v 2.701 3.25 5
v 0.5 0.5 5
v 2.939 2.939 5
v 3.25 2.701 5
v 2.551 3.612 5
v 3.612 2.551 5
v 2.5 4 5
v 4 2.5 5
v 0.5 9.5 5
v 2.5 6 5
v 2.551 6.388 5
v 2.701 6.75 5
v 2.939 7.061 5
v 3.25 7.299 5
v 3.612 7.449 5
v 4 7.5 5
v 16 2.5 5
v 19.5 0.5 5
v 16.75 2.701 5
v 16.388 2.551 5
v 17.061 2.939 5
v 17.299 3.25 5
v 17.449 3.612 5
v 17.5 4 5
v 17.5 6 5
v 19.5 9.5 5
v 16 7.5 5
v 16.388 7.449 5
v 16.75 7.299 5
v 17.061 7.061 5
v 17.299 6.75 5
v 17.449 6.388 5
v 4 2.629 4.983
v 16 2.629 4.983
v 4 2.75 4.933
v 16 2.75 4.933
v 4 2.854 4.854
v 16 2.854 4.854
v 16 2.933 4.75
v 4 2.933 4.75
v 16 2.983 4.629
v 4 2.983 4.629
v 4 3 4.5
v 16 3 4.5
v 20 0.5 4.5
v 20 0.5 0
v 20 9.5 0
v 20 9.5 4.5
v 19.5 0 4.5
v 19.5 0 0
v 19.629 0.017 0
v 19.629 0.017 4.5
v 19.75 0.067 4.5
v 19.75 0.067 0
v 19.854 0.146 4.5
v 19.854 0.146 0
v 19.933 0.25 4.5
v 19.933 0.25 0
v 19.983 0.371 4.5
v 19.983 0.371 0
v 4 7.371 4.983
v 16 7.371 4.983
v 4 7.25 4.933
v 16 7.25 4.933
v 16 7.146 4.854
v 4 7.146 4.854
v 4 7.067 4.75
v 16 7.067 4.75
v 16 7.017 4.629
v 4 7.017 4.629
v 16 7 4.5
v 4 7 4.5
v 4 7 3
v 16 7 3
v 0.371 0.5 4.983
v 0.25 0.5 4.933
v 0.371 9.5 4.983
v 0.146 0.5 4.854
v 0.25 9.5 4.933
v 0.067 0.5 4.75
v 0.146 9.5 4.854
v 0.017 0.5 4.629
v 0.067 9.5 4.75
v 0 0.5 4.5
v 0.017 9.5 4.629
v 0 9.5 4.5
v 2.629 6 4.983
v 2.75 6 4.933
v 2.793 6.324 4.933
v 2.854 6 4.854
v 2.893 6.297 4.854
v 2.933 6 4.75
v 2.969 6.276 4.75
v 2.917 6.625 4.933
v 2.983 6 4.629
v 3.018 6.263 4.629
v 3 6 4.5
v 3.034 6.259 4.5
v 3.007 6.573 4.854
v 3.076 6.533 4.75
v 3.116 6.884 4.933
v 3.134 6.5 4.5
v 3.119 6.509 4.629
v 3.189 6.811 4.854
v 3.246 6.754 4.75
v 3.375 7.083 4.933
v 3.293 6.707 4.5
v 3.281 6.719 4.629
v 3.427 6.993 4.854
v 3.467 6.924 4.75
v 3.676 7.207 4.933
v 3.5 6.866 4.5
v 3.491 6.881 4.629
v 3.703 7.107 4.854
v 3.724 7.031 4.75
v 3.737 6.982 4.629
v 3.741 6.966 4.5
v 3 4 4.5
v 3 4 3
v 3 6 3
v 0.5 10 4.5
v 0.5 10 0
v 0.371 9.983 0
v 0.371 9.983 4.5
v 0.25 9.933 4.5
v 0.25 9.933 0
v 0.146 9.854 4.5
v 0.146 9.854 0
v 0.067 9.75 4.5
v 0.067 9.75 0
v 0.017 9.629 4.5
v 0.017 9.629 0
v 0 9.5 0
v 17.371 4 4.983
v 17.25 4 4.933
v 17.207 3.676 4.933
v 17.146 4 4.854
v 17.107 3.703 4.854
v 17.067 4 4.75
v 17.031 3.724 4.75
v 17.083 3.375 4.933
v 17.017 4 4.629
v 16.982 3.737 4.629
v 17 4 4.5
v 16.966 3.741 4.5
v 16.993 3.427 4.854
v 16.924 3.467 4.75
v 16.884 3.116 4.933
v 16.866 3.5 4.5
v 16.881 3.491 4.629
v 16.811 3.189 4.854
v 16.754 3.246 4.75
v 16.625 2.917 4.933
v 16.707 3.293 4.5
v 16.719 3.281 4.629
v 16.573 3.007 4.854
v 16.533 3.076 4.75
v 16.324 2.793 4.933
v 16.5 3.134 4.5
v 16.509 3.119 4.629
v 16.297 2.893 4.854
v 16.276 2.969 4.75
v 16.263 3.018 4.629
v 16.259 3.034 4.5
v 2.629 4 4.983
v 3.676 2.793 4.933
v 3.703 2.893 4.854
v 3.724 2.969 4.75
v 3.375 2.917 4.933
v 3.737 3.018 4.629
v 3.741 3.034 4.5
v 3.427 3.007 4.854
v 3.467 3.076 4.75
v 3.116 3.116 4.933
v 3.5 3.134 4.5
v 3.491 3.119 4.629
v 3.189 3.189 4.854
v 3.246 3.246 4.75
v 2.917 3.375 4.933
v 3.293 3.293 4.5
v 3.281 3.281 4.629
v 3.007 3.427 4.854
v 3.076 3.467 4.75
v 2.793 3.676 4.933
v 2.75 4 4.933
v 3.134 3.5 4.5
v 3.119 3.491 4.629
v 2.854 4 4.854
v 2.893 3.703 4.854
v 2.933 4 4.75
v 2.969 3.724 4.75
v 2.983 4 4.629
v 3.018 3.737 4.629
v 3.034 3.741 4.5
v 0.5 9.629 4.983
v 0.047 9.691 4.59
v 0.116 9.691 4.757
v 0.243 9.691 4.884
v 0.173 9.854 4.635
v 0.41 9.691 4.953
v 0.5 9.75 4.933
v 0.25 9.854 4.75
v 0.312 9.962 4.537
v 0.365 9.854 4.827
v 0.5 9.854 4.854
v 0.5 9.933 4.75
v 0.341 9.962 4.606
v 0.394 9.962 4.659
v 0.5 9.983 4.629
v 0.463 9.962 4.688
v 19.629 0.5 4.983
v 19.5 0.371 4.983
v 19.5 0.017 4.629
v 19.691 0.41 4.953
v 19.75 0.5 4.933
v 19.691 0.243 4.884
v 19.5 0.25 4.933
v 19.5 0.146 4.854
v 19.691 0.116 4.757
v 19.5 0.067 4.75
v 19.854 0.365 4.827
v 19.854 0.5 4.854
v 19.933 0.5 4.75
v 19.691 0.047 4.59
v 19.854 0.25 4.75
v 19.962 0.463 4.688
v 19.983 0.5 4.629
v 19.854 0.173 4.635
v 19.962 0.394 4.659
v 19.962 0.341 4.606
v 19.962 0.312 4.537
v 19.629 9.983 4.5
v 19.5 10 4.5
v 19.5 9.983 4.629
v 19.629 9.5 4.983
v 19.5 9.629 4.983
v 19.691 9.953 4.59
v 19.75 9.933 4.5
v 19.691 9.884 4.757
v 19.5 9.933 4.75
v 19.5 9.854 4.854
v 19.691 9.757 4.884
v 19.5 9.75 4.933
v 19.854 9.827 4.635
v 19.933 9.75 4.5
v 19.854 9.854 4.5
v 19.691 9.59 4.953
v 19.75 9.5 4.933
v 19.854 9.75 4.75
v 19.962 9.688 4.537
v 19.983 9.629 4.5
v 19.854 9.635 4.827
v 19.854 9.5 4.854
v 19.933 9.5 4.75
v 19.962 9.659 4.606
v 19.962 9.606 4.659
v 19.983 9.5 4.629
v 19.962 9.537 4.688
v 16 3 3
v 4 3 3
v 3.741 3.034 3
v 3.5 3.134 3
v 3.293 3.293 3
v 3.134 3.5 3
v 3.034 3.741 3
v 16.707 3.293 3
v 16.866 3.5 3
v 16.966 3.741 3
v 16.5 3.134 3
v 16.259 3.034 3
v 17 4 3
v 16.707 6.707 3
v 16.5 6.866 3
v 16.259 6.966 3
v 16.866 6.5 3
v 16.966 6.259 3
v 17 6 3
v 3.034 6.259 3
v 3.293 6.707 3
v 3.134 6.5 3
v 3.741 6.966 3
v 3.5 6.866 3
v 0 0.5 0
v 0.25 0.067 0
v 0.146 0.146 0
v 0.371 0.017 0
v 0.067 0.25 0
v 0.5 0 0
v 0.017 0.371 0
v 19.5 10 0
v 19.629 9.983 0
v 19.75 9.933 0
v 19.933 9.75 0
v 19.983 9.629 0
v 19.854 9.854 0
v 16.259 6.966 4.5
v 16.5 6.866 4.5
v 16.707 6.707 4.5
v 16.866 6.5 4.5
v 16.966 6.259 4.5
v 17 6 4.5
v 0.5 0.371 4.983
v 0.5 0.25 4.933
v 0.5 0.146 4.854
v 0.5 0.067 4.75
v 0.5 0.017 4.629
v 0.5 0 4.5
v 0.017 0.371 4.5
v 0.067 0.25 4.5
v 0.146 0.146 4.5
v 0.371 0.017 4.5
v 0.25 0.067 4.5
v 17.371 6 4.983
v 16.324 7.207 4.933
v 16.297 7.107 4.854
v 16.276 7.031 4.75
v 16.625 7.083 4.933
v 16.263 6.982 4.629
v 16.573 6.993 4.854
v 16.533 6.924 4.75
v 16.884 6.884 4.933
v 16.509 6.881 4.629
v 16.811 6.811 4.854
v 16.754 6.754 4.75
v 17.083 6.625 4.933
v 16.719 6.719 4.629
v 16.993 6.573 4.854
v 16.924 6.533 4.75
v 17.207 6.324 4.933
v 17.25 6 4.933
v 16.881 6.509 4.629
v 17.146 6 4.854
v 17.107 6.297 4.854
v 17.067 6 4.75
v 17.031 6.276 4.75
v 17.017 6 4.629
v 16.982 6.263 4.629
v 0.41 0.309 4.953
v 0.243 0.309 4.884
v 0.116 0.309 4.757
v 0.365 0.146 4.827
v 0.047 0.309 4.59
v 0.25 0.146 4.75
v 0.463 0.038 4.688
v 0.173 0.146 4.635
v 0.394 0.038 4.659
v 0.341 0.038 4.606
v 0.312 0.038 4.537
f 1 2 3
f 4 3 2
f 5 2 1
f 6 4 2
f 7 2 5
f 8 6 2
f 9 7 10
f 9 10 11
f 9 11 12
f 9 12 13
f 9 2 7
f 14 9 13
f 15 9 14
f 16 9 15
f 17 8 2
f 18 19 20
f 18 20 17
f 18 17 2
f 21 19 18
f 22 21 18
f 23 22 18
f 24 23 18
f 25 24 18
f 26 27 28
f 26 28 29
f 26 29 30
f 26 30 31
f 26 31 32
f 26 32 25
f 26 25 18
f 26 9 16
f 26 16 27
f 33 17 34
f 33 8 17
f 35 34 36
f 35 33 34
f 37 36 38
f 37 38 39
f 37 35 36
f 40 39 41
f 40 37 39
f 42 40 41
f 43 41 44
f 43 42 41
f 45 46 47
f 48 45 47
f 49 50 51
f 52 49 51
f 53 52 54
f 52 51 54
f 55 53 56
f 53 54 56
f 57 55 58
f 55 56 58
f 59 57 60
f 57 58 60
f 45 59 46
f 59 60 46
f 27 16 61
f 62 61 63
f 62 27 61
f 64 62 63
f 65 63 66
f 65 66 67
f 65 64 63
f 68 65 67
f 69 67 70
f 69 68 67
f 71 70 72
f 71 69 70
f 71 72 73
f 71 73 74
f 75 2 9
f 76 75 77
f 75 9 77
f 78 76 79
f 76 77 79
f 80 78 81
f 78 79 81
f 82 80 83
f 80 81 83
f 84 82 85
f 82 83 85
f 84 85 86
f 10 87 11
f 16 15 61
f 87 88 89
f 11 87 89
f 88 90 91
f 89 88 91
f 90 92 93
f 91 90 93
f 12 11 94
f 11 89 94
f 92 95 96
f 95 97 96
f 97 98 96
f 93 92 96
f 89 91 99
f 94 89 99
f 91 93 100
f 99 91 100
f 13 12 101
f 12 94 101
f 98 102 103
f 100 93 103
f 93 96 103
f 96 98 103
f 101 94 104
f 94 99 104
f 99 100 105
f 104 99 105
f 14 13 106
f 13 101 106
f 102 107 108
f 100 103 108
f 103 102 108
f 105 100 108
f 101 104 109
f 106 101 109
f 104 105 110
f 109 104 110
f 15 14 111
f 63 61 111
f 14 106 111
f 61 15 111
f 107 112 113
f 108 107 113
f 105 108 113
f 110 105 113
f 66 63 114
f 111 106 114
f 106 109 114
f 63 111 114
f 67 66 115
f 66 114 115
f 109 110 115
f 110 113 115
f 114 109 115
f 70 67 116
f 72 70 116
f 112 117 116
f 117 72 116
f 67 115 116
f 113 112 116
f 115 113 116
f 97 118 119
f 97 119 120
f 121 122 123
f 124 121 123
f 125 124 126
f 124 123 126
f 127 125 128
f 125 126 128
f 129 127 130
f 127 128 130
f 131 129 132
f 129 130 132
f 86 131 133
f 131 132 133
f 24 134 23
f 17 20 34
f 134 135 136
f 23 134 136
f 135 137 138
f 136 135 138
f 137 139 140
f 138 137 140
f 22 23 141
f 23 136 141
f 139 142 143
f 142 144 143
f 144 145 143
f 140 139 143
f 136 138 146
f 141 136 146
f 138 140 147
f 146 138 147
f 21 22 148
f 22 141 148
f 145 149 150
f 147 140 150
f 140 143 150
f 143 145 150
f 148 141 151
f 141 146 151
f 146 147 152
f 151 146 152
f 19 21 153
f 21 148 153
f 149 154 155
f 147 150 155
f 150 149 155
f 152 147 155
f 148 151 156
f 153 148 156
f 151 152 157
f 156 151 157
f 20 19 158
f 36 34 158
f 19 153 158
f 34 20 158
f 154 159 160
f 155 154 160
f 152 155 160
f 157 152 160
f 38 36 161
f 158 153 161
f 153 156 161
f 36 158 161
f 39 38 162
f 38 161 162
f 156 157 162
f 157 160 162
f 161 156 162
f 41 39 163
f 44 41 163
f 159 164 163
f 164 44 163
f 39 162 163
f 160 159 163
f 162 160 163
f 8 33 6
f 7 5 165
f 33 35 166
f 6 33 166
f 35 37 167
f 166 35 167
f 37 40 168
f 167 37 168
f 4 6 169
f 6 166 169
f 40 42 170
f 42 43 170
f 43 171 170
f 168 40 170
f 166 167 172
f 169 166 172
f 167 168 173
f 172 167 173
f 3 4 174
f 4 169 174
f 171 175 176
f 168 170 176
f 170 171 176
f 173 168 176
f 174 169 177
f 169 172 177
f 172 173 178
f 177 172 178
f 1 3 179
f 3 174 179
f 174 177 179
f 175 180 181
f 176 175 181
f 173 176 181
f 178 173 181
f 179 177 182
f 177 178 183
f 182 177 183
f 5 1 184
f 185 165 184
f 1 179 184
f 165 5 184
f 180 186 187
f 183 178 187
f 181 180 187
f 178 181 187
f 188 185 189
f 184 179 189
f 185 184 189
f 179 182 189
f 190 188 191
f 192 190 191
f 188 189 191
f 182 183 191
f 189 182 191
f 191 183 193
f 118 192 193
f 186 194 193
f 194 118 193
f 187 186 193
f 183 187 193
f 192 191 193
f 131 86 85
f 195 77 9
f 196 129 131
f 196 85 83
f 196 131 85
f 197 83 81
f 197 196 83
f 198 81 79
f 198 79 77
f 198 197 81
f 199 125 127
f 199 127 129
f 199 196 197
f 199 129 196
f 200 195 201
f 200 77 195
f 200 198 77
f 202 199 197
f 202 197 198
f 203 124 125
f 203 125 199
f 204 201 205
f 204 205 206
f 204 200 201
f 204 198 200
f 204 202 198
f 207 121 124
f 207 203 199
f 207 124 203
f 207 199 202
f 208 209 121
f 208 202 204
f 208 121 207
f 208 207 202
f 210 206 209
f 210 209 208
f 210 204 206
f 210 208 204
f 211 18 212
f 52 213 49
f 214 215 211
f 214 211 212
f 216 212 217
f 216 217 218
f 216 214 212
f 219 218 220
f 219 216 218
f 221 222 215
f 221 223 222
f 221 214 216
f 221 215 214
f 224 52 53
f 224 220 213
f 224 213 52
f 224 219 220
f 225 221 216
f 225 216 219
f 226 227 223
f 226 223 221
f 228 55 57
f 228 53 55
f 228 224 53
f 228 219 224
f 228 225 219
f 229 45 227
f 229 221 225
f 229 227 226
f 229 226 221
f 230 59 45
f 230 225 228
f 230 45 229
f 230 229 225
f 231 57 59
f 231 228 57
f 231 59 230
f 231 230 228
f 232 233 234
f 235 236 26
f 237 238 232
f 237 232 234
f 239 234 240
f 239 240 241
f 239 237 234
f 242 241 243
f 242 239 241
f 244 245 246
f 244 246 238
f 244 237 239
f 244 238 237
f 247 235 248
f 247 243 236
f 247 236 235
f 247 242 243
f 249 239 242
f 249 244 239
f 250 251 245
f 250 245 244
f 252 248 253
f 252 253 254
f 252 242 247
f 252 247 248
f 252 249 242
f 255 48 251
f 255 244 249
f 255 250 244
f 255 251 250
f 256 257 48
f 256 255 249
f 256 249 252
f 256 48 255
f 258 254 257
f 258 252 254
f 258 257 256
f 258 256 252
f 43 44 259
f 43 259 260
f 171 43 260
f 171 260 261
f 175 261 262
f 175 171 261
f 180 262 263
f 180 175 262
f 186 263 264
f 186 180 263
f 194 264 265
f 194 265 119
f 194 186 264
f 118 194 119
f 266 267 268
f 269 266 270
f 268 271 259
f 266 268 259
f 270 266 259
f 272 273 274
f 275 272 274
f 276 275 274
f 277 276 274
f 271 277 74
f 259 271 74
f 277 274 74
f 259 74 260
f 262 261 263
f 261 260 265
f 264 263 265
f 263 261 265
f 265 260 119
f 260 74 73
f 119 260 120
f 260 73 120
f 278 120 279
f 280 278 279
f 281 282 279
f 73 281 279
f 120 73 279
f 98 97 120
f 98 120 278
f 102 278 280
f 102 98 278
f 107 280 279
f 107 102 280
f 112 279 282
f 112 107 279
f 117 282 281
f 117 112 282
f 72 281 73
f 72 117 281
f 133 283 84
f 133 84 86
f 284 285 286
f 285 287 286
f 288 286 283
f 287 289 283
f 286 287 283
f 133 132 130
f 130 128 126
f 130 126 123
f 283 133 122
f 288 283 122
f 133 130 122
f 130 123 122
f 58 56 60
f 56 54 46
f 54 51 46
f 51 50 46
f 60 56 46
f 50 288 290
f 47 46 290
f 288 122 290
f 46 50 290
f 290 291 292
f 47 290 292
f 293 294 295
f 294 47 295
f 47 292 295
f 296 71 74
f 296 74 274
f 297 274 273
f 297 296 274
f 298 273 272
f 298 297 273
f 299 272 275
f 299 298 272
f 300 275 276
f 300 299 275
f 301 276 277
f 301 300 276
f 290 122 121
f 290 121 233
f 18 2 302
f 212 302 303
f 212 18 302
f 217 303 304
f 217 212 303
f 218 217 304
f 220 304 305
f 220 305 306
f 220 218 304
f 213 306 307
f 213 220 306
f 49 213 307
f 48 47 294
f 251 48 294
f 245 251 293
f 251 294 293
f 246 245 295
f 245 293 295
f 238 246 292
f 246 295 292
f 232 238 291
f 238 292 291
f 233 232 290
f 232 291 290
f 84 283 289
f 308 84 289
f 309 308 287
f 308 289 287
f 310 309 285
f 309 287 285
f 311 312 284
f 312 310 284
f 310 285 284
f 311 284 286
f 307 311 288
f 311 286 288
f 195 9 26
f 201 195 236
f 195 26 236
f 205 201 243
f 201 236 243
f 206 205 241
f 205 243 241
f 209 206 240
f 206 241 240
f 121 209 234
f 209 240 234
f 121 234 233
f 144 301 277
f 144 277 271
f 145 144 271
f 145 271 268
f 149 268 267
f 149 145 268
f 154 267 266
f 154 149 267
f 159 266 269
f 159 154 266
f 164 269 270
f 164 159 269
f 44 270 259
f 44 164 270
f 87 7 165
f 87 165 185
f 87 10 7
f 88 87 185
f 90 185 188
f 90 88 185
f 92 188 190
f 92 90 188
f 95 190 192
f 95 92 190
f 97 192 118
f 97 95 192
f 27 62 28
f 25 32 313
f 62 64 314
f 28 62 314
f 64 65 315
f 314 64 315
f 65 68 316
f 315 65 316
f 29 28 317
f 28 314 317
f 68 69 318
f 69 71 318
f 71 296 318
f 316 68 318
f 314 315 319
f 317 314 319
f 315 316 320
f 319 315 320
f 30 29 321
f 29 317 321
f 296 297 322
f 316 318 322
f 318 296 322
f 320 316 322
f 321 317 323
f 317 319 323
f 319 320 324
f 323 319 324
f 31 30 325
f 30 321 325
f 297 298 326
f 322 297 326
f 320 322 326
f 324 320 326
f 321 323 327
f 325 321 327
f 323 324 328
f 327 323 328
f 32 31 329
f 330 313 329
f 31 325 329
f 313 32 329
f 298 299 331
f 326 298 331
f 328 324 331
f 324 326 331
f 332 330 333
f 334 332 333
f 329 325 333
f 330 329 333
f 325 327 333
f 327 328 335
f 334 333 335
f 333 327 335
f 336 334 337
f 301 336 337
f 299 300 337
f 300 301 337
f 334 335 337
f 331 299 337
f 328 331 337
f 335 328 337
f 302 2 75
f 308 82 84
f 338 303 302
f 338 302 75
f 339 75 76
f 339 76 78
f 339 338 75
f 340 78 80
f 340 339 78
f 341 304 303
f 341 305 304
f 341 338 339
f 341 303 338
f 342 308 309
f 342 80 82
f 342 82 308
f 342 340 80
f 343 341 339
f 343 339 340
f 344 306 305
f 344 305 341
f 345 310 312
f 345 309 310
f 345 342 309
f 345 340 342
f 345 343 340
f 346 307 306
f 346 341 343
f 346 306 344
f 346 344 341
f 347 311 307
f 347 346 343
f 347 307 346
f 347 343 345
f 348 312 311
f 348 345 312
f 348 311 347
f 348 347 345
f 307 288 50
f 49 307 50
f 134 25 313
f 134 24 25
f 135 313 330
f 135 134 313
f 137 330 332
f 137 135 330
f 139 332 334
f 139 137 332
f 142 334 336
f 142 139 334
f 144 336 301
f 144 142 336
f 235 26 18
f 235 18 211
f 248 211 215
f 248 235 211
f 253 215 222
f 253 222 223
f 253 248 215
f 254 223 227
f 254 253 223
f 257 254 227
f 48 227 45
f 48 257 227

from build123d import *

# Parameters (mm, degrees)
SKIZZE1_W                       = 20
SKIZZE1_H                       = 10
AUFSATZ_LINEAR_AUSTRAGEN1_DEPTH = 5
SCHNITT_LINEAR_AUSTRAGEN2_DEPTH = 2
VERRUNDUNG2_R                   = 0.5
VERRUNDUNG3_R                   = 0.5
VERRUNDUNG4_R                   = 0.5
VERRUNDUNG5_R                   = 0.5
VERRUNDUNG6_R                   = 0.5
VERRUNDUNG7_R                   = 0.5


with BuildPart() as part:
    # Skizze1 → Aufsatz-Linear austragen1 (new body)
    with BuildSketch(Plane.XY):
        with Locations((10, 5)):
            Rectangle(SKIZZE1_W, SKIZZE1_H)
    extrude(amount=AUFSATZ_LINEAR_AUSTRAGEN1_DEPTH)

    # Skizze3 → Schnitt-Linear austragen2 (cut)
    with BuildSketch(Plane.XY.offset(5)):
        with BuildLine():
            Line((4, 7), (16, 7))
            ThreePointArc((16, 7), (16.707106781, 6.707106781), (17, 6))
            Line((17, 6), (17, 4))
            ThreePointArc((17, 4), (16.707106781, 3.292893219), (16, 3))
            Line((16, 3), (4, 3))
            ThreePointArc((4, 3), (3.292893219, 3.292893219), (3, 4))
            Line((3, 4), (3, 6))
            ThreePointArc((3, 6), (3.292893219, 6.707106781), (4, 7))
        make_face()
    extrude(amount=-SCHNITT_LINEAR_AUSTRAGEN2_DEPTH, mode=Mode.SUBTRACT)

    # Verrundung2
    verrundung2_edges = [part.edges().sort_by_distance(p)[0] for p in [
        (3.292893219, 3.292893219, 5),
        (10, 3, 5),
        (16.707106781, 3.292893219, 5),
        (17, 5, 5),
        (16.707106781, 6.707106781, 5),
        (10, 7, 5),
        (3.292893219, 6.707106781, 5),
        (3, 5, 5),
    ]]
    fillet(verrundung2_edges, radius=VERRUNDUNG2_R)

    # Verrundung3
    verrundung3_edges = [part.edges().sort_by_distance(p)[0] for p in [
        (20, 5, 5),
        (10, 10, 5),
        (0, 5, 5),
        (10, 0, 5),
    ]]
    fillet(verrundung3_edges, radius=VERRUNDUNG3_R)

    # Verrundung4
    # the kernel refuses this fillet: 0.5 mm, written as the material it takes off along each edge
    with BuildSketch(Plane(origin=(19.5, 9.5, 4.5), x_dir=(0, 1, 0), z_dir=(1, 0, 0))) as verrundung4_piece_1_section:
        Polygon((0, 0), (VERRUNDUNG4_R, 0), (VERRUNDUNG4_R, VERRUNDUNG4_R), (0, VERRUNDUNG4_R), align=None)
    verrundung4_piece_1 = extrude(amount=VERRUNDUNG4_R, mode=Mode.PRIVATE)
    verrundung4_piece_1 = verrundung4_piece_1 - Plane(origin=(19.5, 9.5, 4.5), x_dir=(0, -0.7071067811865475, -0.7071067811865475), z_dir=(1, 0, 0)) * Sphere(VERRUNDUNG4_R, mode=Mode.PRIVATE)
    add(verrundung4_piece_1, mode=Mode.SUBTRACT)
    with BuildSketch(Plane(origin=(20, 10, -1.25), x_dir=(0, -1, 0), z_dir=(0, 0, 1))) as verrundung4_piece_2:
        with BuildLine():
            CenterArc((VERRUNDUNG4_R, -VERRUNDUNG4_R), VERRUNDUNG4_R, 90, 90)
            Line((0, -VERRUNDUNG4_R), (0, 0))
            Line((0, 0), (VERRUNDUNG4_R, 0))
        make_face()
    extrude(amount=5.75, mode=Mode.SUBTRACT)

    # Verrundung5
    # the kernel refuses this fillet: 0.5 mm, written as the material it takes off along each edge
    with BuildSketch(Plane(origin=(0.5, 9.5, 4.5), x_dir=(-1, 0, 0), z_dir=(0, 1, 0))) as verrundung5_piece_1_section:
        Polygon((0, 0), (VERRUNDUNG5_R, 0), (VERRUNDUNG5_R, VERRUNDUNG5_R), (0, VERRUNDUNG5_R), align=None)
    verrundung5_piece_1 = extrude(amount=VERRUNDUNG5_R, mode=Mode.PRIVATE)
    verrundung5_piece_1 = verrundung5_piece_1 - Plane(origin=(0.5, 9.5, 4.5), x_dir=(0.7071067811865475, 0, -0.7071067811865475), z_dir=(0, 1, 0)) * Sphere(VERRUNDUNG5_R, mode=Mode.PRIVATE)
    add(verrundung5_piece_1, mode=Mode.SUBTRACT)
    with BuildSketch(Plane(origin=(0, 10, -1.25), x_dir=(1, 0, 0), z_dir=(0, 0, 1))) as verrundung5_piece_2:
        with BuildLine():
            CenterArc((VERRUNDUNG5_R, -VERRUNDUNG5_R), VERRUNDUNG5_R, 90, 90)
            Line((0, -VERRUNDUNG5_R), (0, 0))
            Line((0, 0), (VERRUNDUNG5_R, 0))
        make_face()
    extrude(amount=5.75, mode=Mode.SUBTRACT)

    # Verrundung6
    # the kernel refuses this fillet: 0.5 mm, written as the material it takes off along each edge
    with BuildSketch(Plane(origin=(0.5, 0.5, 4.5), x_dir=(-1, 0, 0), z_dir=(0, -1, 0))) as verrundung6_piece_1_section:
        Polygon((0, 0), (VERRUNDUNG6_R, 0), (VERRUNDUNG6_R, -VERRUNDUNG6_R), (0, -VERRUNDUNG6_R), align=None)
    verrundung6_piece_1 = extrude(amount=VERRUNDUNG6_R, mode=Mode.PRIVATE)
    verrundung6_piece_1 = verrundung6_piece_1 - Plane(origin=(0.5, 0.5, 4.5), x_dir=(0.7071067811865475, 0, -0.7071067811865475), z_dir=(0, -1, 0)) * Sphere(VERRUNDUNG6_R, mode=Mode.PRIVATE)
    add(verrundung6_piece_1, mode=Mode.SUBTRACT)
    with BuildSketch(Plane(origin=(0, 0, -1.25), x_dir=(1, 0, 0), z_dir=(0, 0, 1))) as verrundung6_piece_2:
        with BuildLine():
            CenterArc((VERRUNDUNG6_R, VERRUNDUNG6_R), VERRUNDUNG6_R, 180, 90)
            Line((0, VERRUNDUNG6_R), (0, 0))
            Line((0, 0), (VERRUNDUNG6_R, 0))
        make_face()
    extrude(amount=5.75, mode=Mode.SUBTRACT)

    # Verrundung7
    # the kernel refuses this fillet: 0.5 mm, written as the material it takes off along each edge
    with BuildSketch(Plane(origin=(19.5, 0.5, 4.5), x_dir=(0, -1, 0), z_dir=(1, 0, 0))) as verrundung7_piece_1_section:
        Polygon((0, 0), (VERRUNDUNG7_R, 0), (VERRUNDUNG7_R, -VERRUNDUNG7_R), (0, -VERRUNDUNG7_R), align=None)
    verrundung7_piece_1 = extrude(amount=VERRUNDUNG7_R, mode=Mode.PRIVATE)
    verrundung7_piece_1 = verrundung7_piece_1 - Plane(origin=(19.5, 0.5, 4.5), x_dir=(0, 0.7071067811865475, -0.7071067811865475), z_dir=(1, 0, 0)) * Sphere(VERRUNDUNG7_R, mode=Mode.PRIVATE)
    add(verrundung7_piece_1, mode=Mode.SUBTRACT)
    with BuildSketch(Plane(origin=(20, 0, -1.25), x_dir=(0, 1, 0), z_dir=(0, 0, 1))) as verrundung7_piece_2:
        with BuildLine():
            CenterArc((VERRUNDUNG7_R, VERRUNDUNG7_R), VERRUNDUNG7_R, 180, 90)
            Line((0, VERRUNDUNG7_R), (0, 0))
            Line((0, 0), (VERRUNDUNG7_R, 0))
        make_face()
    extrude(amount=5.75, mode=Mode.SUBTRACT)


solid = part.part
